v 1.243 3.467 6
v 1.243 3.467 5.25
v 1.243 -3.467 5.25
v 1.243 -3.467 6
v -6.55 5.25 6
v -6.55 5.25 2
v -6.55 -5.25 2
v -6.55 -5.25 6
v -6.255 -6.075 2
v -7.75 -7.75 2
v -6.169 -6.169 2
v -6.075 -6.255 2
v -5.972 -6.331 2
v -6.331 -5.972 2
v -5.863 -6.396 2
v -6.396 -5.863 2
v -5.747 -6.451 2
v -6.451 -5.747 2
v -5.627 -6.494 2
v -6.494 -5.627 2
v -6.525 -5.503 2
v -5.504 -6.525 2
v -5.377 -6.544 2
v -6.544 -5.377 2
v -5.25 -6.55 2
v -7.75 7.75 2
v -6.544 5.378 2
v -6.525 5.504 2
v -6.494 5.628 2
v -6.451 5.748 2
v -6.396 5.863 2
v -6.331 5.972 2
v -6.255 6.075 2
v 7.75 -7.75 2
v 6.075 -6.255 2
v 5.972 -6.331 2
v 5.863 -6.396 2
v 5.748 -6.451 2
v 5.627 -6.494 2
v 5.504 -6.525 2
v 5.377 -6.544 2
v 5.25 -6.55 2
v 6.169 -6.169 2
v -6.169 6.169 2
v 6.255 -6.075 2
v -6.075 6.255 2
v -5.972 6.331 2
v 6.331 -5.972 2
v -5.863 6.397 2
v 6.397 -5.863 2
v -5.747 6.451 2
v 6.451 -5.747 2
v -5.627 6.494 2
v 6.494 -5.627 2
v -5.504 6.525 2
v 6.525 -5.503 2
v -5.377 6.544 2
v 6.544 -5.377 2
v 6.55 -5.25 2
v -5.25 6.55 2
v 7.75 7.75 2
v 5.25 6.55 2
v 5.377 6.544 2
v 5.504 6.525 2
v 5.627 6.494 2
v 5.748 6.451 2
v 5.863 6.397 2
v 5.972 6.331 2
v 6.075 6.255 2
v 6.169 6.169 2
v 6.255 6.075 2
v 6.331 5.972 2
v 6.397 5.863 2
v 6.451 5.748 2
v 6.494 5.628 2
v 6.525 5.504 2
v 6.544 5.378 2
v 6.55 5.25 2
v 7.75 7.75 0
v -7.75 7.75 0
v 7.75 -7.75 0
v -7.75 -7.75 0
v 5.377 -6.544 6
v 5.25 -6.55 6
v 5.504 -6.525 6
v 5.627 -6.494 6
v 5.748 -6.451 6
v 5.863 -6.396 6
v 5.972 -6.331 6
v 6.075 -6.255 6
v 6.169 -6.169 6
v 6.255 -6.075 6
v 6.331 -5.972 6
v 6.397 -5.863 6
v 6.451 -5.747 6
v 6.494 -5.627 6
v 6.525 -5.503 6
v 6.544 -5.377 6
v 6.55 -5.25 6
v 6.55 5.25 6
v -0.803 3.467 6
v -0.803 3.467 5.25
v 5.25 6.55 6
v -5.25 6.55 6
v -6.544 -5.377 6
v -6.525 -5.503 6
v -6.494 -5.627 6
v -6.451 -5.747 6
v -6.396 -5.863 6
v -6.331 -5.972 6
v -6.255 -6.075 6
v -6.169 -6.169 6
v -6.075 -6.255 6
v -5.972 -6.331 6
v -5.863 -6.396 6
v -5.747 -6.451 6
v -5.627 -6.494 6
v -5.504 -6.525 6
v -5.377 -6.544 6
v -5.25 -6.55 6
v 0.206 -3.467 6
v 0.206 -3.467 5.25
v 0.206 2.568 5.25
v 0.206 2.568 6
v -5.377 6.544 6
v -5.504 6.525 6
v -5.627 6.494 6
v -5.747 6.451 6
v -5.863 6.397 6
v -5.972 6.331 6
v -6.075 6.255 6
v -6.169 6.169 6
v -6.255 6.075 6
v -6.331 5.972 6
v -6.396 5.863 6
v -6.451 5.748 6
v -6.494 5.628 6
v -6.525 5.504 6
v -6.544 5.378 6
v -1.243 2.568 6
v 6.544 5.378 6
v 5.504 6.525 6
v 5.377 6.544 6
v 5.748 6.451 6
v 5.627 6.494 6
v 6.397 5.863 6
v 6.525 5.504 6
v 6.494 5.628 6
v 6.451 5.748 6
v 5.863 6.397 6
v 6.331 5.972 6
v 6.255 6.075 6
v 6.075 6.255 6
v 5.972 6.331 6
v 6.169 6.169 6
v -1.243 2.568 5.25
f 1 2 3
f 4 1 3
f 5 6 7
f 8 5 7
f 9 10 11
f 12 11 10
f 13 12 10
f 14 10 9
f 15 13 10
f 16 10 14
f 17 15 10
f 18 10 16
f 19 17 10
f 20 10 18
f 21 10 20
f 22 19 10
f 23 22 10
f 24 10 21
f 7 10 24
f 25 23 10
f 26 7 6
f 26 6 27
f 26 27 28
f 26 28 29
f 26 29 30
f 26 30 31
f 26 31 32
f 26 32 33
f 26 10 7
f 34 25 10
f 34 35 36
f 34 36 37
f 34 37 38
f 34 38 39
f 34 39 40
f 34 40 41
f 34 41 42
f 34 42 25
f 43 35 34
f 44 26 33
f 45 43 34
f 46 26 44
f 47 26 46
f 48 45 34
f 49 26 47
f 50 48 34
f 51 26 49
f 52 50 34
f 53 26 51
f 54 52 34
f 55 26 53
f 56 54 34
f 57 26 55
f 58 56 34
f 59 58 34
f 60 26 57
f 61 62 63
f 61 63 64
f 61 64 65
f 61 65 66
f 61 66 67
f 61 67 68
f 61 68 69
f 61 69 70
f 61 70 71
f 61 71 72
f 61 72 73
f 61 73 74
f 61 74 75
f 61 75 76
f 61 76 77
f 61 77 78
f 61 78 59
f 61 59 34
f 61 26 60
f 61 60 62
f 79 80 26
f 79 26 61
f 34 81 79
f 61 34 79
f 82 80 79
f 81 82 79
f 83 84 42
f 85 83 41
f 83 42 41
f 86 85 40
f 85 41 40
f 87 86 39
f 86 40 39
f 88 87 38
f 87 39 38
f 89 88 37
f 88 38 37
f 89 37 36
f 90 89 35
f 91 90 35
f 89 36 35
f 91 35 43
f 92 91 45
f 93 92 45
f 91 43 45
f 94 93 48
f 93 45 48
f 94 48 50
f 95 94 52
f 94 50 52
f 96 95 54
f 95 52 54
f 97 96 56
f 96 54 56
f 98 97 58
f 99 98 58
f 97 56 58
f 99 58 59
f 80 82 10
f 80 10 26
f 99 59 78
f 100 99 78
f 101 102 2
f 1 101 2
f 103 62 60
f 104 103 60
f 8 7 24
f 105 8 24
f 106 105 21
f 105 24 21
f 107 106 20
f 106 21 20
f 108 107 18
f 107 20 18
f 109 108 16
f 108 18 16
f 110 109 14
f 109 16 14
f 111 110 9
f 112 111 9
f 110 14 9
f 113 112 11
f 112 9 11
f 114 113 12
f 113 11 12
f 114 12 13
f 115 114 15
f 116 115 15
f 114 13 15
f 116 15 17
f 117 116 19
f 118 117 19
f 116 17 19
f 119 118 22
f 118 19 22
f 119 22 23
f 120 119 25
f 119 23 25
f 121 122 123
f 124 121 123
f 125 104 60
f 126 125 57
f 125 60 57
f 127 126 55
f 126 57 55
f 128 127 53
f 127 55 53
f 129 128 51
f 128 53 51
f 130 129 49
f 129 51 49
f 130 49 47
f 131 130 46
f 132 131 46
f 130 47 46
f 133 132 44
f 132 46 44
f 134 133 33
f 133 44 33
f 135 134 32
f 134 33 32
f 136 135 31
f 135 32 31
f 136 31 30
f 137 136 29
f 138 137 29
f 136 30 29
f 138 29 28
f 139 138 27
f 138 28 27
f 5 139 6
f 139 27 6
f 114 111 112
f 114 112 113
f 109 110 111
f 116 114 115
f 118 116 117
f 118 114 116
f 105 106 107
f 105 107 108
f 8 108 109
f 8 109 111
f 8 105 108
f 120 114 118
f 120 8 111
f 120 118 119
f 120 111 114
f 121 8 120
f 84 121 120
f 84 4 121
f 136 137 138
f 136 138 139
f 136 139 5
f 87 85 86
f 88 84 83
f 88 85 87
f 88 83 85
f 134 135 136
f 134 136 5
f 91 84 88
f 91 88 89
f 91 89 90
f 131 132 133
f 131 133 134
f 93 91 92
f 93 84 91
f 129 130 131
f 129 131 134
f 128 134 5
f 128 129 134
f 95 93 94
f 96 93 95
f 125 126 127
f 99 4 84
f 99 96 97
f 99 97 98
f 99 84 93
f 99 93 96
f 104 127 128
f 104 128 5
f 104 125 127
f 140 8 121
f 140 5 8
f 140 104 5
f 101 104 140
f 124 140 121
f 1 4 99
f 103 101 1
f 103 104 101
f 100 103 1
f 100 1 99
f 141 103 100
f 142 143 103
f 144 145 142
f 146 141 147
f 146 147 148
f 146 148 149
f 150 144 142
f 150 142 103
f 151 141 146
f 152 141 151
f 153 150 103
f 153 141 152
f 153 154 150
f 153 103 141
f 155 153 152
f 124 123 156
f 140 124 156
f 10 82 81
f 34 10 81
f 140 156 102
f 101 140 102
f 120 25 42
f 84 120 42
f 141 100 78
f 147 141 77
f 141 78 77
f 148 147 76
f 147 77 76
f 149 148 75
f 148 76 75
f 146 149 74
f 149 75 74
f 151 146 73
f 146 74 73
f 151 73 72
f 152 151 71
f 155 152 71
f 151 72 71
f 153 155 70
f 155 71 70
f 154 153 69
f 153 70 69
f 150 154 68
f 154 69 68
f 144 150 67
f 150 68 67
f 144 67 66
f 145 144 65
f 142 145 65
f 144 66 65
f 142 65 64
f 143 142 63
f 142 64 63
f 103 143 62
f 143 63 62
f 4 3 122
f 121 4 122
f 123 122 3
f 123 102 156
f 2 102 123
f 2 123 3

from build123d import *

# Parameters (mm, degrees)
F0_W     = 15.5
F0_H     = 15.5
F1_DEPTH = 2
F2_DEPTH = 6
F3_DEPTH = 5.25


with BuildPart() as f1:
    # F0 (on Top) → F1 (new body)
    with BuildSketch(Plane.XY):
        Rectangle(F0_W, F0_H)
        with BuildLine():
            Line((-6.549937, -5.249806), (-6.549937, 5.250194))
            ThreePointArc((-6.549937, 5.250194), (-6.169176, 6.169433), (-5.249937, 6.550194))
            Line((-5.249937, 6.550194), (5.250063, 6.550194))
            ThreePointArc((5.250063, 6.550194), (6.169302, 6.169433), (6.550063, 5.250194))
            Line((6.550063, 5.250194), (6.550063, -5.249806))
            ThreePointArc((6.550063, -5.249806), (6.169302, -6.169045), (5.250063, -6.549806))
            Line((5.250063, -6.549806), (-5.249937, -6.549806))
            ThreePointArc((-5.249937, -6.549806), (-6.169176, -6.169045), (-6.549937, -5.249806))
        make_face(mode=Mode.SUBTRACT)
    extrude(amount=F1_DEPTH)

    # F0 (on Top) → F2 (join)
    with BuildSketch(Plane.XY):
        with BuildLine():
            ThreePointArc((-5.249937, 6.550194), (-6.169176, 6.169433), (-6.549937, 5.250194))
            Line((-6.549937, 5.250194), (-6.549937, -5.249806))
            ThreePointArc((-6.549937, -5.249806), (-6.169176, -6.169045), (-5.249937, -6.549806))
            Line((-5.249937, -6.549806), (5.250063, -6.549806))
            ThreePointArc((5.250063, -6.549806), (6.169302, -6.169045), (6.550063, -5.249806))
            Line((6.550063, -5.249806), (6.550063, 5.250194))
            ThreePointArc((6.550063, 5.250194), (6.169302, 6.169433), (5.250063, 6.550194))
            Line((5.250063, 6.550194), (-5.249937, 6.550194))
        make_face()
        Polygon((1.24317, -3.46653), (0.205601, -3.46653), (0.205601, 2.567623), (-1.243169, 2.567623), (-0.803279, 3.46653), (1.24317, 3.46653), align=None, mode=Mode.SUBTRACT)
    extrude(amount=F2_DEPTH)

    # F0 (on Top) → F3 (join)
    with BuildSketch(Plane.XY):
        Polygon((0.205601, 2.567623), (0.205601, -3.46653), (1.24317, -3.46653), (1.24317, 3.46653), (-0.803279, 3.46653), (-1.243169, 2.567623), align=None)
    extrude(amount=F3_DEPTH)


solid = f1.part
